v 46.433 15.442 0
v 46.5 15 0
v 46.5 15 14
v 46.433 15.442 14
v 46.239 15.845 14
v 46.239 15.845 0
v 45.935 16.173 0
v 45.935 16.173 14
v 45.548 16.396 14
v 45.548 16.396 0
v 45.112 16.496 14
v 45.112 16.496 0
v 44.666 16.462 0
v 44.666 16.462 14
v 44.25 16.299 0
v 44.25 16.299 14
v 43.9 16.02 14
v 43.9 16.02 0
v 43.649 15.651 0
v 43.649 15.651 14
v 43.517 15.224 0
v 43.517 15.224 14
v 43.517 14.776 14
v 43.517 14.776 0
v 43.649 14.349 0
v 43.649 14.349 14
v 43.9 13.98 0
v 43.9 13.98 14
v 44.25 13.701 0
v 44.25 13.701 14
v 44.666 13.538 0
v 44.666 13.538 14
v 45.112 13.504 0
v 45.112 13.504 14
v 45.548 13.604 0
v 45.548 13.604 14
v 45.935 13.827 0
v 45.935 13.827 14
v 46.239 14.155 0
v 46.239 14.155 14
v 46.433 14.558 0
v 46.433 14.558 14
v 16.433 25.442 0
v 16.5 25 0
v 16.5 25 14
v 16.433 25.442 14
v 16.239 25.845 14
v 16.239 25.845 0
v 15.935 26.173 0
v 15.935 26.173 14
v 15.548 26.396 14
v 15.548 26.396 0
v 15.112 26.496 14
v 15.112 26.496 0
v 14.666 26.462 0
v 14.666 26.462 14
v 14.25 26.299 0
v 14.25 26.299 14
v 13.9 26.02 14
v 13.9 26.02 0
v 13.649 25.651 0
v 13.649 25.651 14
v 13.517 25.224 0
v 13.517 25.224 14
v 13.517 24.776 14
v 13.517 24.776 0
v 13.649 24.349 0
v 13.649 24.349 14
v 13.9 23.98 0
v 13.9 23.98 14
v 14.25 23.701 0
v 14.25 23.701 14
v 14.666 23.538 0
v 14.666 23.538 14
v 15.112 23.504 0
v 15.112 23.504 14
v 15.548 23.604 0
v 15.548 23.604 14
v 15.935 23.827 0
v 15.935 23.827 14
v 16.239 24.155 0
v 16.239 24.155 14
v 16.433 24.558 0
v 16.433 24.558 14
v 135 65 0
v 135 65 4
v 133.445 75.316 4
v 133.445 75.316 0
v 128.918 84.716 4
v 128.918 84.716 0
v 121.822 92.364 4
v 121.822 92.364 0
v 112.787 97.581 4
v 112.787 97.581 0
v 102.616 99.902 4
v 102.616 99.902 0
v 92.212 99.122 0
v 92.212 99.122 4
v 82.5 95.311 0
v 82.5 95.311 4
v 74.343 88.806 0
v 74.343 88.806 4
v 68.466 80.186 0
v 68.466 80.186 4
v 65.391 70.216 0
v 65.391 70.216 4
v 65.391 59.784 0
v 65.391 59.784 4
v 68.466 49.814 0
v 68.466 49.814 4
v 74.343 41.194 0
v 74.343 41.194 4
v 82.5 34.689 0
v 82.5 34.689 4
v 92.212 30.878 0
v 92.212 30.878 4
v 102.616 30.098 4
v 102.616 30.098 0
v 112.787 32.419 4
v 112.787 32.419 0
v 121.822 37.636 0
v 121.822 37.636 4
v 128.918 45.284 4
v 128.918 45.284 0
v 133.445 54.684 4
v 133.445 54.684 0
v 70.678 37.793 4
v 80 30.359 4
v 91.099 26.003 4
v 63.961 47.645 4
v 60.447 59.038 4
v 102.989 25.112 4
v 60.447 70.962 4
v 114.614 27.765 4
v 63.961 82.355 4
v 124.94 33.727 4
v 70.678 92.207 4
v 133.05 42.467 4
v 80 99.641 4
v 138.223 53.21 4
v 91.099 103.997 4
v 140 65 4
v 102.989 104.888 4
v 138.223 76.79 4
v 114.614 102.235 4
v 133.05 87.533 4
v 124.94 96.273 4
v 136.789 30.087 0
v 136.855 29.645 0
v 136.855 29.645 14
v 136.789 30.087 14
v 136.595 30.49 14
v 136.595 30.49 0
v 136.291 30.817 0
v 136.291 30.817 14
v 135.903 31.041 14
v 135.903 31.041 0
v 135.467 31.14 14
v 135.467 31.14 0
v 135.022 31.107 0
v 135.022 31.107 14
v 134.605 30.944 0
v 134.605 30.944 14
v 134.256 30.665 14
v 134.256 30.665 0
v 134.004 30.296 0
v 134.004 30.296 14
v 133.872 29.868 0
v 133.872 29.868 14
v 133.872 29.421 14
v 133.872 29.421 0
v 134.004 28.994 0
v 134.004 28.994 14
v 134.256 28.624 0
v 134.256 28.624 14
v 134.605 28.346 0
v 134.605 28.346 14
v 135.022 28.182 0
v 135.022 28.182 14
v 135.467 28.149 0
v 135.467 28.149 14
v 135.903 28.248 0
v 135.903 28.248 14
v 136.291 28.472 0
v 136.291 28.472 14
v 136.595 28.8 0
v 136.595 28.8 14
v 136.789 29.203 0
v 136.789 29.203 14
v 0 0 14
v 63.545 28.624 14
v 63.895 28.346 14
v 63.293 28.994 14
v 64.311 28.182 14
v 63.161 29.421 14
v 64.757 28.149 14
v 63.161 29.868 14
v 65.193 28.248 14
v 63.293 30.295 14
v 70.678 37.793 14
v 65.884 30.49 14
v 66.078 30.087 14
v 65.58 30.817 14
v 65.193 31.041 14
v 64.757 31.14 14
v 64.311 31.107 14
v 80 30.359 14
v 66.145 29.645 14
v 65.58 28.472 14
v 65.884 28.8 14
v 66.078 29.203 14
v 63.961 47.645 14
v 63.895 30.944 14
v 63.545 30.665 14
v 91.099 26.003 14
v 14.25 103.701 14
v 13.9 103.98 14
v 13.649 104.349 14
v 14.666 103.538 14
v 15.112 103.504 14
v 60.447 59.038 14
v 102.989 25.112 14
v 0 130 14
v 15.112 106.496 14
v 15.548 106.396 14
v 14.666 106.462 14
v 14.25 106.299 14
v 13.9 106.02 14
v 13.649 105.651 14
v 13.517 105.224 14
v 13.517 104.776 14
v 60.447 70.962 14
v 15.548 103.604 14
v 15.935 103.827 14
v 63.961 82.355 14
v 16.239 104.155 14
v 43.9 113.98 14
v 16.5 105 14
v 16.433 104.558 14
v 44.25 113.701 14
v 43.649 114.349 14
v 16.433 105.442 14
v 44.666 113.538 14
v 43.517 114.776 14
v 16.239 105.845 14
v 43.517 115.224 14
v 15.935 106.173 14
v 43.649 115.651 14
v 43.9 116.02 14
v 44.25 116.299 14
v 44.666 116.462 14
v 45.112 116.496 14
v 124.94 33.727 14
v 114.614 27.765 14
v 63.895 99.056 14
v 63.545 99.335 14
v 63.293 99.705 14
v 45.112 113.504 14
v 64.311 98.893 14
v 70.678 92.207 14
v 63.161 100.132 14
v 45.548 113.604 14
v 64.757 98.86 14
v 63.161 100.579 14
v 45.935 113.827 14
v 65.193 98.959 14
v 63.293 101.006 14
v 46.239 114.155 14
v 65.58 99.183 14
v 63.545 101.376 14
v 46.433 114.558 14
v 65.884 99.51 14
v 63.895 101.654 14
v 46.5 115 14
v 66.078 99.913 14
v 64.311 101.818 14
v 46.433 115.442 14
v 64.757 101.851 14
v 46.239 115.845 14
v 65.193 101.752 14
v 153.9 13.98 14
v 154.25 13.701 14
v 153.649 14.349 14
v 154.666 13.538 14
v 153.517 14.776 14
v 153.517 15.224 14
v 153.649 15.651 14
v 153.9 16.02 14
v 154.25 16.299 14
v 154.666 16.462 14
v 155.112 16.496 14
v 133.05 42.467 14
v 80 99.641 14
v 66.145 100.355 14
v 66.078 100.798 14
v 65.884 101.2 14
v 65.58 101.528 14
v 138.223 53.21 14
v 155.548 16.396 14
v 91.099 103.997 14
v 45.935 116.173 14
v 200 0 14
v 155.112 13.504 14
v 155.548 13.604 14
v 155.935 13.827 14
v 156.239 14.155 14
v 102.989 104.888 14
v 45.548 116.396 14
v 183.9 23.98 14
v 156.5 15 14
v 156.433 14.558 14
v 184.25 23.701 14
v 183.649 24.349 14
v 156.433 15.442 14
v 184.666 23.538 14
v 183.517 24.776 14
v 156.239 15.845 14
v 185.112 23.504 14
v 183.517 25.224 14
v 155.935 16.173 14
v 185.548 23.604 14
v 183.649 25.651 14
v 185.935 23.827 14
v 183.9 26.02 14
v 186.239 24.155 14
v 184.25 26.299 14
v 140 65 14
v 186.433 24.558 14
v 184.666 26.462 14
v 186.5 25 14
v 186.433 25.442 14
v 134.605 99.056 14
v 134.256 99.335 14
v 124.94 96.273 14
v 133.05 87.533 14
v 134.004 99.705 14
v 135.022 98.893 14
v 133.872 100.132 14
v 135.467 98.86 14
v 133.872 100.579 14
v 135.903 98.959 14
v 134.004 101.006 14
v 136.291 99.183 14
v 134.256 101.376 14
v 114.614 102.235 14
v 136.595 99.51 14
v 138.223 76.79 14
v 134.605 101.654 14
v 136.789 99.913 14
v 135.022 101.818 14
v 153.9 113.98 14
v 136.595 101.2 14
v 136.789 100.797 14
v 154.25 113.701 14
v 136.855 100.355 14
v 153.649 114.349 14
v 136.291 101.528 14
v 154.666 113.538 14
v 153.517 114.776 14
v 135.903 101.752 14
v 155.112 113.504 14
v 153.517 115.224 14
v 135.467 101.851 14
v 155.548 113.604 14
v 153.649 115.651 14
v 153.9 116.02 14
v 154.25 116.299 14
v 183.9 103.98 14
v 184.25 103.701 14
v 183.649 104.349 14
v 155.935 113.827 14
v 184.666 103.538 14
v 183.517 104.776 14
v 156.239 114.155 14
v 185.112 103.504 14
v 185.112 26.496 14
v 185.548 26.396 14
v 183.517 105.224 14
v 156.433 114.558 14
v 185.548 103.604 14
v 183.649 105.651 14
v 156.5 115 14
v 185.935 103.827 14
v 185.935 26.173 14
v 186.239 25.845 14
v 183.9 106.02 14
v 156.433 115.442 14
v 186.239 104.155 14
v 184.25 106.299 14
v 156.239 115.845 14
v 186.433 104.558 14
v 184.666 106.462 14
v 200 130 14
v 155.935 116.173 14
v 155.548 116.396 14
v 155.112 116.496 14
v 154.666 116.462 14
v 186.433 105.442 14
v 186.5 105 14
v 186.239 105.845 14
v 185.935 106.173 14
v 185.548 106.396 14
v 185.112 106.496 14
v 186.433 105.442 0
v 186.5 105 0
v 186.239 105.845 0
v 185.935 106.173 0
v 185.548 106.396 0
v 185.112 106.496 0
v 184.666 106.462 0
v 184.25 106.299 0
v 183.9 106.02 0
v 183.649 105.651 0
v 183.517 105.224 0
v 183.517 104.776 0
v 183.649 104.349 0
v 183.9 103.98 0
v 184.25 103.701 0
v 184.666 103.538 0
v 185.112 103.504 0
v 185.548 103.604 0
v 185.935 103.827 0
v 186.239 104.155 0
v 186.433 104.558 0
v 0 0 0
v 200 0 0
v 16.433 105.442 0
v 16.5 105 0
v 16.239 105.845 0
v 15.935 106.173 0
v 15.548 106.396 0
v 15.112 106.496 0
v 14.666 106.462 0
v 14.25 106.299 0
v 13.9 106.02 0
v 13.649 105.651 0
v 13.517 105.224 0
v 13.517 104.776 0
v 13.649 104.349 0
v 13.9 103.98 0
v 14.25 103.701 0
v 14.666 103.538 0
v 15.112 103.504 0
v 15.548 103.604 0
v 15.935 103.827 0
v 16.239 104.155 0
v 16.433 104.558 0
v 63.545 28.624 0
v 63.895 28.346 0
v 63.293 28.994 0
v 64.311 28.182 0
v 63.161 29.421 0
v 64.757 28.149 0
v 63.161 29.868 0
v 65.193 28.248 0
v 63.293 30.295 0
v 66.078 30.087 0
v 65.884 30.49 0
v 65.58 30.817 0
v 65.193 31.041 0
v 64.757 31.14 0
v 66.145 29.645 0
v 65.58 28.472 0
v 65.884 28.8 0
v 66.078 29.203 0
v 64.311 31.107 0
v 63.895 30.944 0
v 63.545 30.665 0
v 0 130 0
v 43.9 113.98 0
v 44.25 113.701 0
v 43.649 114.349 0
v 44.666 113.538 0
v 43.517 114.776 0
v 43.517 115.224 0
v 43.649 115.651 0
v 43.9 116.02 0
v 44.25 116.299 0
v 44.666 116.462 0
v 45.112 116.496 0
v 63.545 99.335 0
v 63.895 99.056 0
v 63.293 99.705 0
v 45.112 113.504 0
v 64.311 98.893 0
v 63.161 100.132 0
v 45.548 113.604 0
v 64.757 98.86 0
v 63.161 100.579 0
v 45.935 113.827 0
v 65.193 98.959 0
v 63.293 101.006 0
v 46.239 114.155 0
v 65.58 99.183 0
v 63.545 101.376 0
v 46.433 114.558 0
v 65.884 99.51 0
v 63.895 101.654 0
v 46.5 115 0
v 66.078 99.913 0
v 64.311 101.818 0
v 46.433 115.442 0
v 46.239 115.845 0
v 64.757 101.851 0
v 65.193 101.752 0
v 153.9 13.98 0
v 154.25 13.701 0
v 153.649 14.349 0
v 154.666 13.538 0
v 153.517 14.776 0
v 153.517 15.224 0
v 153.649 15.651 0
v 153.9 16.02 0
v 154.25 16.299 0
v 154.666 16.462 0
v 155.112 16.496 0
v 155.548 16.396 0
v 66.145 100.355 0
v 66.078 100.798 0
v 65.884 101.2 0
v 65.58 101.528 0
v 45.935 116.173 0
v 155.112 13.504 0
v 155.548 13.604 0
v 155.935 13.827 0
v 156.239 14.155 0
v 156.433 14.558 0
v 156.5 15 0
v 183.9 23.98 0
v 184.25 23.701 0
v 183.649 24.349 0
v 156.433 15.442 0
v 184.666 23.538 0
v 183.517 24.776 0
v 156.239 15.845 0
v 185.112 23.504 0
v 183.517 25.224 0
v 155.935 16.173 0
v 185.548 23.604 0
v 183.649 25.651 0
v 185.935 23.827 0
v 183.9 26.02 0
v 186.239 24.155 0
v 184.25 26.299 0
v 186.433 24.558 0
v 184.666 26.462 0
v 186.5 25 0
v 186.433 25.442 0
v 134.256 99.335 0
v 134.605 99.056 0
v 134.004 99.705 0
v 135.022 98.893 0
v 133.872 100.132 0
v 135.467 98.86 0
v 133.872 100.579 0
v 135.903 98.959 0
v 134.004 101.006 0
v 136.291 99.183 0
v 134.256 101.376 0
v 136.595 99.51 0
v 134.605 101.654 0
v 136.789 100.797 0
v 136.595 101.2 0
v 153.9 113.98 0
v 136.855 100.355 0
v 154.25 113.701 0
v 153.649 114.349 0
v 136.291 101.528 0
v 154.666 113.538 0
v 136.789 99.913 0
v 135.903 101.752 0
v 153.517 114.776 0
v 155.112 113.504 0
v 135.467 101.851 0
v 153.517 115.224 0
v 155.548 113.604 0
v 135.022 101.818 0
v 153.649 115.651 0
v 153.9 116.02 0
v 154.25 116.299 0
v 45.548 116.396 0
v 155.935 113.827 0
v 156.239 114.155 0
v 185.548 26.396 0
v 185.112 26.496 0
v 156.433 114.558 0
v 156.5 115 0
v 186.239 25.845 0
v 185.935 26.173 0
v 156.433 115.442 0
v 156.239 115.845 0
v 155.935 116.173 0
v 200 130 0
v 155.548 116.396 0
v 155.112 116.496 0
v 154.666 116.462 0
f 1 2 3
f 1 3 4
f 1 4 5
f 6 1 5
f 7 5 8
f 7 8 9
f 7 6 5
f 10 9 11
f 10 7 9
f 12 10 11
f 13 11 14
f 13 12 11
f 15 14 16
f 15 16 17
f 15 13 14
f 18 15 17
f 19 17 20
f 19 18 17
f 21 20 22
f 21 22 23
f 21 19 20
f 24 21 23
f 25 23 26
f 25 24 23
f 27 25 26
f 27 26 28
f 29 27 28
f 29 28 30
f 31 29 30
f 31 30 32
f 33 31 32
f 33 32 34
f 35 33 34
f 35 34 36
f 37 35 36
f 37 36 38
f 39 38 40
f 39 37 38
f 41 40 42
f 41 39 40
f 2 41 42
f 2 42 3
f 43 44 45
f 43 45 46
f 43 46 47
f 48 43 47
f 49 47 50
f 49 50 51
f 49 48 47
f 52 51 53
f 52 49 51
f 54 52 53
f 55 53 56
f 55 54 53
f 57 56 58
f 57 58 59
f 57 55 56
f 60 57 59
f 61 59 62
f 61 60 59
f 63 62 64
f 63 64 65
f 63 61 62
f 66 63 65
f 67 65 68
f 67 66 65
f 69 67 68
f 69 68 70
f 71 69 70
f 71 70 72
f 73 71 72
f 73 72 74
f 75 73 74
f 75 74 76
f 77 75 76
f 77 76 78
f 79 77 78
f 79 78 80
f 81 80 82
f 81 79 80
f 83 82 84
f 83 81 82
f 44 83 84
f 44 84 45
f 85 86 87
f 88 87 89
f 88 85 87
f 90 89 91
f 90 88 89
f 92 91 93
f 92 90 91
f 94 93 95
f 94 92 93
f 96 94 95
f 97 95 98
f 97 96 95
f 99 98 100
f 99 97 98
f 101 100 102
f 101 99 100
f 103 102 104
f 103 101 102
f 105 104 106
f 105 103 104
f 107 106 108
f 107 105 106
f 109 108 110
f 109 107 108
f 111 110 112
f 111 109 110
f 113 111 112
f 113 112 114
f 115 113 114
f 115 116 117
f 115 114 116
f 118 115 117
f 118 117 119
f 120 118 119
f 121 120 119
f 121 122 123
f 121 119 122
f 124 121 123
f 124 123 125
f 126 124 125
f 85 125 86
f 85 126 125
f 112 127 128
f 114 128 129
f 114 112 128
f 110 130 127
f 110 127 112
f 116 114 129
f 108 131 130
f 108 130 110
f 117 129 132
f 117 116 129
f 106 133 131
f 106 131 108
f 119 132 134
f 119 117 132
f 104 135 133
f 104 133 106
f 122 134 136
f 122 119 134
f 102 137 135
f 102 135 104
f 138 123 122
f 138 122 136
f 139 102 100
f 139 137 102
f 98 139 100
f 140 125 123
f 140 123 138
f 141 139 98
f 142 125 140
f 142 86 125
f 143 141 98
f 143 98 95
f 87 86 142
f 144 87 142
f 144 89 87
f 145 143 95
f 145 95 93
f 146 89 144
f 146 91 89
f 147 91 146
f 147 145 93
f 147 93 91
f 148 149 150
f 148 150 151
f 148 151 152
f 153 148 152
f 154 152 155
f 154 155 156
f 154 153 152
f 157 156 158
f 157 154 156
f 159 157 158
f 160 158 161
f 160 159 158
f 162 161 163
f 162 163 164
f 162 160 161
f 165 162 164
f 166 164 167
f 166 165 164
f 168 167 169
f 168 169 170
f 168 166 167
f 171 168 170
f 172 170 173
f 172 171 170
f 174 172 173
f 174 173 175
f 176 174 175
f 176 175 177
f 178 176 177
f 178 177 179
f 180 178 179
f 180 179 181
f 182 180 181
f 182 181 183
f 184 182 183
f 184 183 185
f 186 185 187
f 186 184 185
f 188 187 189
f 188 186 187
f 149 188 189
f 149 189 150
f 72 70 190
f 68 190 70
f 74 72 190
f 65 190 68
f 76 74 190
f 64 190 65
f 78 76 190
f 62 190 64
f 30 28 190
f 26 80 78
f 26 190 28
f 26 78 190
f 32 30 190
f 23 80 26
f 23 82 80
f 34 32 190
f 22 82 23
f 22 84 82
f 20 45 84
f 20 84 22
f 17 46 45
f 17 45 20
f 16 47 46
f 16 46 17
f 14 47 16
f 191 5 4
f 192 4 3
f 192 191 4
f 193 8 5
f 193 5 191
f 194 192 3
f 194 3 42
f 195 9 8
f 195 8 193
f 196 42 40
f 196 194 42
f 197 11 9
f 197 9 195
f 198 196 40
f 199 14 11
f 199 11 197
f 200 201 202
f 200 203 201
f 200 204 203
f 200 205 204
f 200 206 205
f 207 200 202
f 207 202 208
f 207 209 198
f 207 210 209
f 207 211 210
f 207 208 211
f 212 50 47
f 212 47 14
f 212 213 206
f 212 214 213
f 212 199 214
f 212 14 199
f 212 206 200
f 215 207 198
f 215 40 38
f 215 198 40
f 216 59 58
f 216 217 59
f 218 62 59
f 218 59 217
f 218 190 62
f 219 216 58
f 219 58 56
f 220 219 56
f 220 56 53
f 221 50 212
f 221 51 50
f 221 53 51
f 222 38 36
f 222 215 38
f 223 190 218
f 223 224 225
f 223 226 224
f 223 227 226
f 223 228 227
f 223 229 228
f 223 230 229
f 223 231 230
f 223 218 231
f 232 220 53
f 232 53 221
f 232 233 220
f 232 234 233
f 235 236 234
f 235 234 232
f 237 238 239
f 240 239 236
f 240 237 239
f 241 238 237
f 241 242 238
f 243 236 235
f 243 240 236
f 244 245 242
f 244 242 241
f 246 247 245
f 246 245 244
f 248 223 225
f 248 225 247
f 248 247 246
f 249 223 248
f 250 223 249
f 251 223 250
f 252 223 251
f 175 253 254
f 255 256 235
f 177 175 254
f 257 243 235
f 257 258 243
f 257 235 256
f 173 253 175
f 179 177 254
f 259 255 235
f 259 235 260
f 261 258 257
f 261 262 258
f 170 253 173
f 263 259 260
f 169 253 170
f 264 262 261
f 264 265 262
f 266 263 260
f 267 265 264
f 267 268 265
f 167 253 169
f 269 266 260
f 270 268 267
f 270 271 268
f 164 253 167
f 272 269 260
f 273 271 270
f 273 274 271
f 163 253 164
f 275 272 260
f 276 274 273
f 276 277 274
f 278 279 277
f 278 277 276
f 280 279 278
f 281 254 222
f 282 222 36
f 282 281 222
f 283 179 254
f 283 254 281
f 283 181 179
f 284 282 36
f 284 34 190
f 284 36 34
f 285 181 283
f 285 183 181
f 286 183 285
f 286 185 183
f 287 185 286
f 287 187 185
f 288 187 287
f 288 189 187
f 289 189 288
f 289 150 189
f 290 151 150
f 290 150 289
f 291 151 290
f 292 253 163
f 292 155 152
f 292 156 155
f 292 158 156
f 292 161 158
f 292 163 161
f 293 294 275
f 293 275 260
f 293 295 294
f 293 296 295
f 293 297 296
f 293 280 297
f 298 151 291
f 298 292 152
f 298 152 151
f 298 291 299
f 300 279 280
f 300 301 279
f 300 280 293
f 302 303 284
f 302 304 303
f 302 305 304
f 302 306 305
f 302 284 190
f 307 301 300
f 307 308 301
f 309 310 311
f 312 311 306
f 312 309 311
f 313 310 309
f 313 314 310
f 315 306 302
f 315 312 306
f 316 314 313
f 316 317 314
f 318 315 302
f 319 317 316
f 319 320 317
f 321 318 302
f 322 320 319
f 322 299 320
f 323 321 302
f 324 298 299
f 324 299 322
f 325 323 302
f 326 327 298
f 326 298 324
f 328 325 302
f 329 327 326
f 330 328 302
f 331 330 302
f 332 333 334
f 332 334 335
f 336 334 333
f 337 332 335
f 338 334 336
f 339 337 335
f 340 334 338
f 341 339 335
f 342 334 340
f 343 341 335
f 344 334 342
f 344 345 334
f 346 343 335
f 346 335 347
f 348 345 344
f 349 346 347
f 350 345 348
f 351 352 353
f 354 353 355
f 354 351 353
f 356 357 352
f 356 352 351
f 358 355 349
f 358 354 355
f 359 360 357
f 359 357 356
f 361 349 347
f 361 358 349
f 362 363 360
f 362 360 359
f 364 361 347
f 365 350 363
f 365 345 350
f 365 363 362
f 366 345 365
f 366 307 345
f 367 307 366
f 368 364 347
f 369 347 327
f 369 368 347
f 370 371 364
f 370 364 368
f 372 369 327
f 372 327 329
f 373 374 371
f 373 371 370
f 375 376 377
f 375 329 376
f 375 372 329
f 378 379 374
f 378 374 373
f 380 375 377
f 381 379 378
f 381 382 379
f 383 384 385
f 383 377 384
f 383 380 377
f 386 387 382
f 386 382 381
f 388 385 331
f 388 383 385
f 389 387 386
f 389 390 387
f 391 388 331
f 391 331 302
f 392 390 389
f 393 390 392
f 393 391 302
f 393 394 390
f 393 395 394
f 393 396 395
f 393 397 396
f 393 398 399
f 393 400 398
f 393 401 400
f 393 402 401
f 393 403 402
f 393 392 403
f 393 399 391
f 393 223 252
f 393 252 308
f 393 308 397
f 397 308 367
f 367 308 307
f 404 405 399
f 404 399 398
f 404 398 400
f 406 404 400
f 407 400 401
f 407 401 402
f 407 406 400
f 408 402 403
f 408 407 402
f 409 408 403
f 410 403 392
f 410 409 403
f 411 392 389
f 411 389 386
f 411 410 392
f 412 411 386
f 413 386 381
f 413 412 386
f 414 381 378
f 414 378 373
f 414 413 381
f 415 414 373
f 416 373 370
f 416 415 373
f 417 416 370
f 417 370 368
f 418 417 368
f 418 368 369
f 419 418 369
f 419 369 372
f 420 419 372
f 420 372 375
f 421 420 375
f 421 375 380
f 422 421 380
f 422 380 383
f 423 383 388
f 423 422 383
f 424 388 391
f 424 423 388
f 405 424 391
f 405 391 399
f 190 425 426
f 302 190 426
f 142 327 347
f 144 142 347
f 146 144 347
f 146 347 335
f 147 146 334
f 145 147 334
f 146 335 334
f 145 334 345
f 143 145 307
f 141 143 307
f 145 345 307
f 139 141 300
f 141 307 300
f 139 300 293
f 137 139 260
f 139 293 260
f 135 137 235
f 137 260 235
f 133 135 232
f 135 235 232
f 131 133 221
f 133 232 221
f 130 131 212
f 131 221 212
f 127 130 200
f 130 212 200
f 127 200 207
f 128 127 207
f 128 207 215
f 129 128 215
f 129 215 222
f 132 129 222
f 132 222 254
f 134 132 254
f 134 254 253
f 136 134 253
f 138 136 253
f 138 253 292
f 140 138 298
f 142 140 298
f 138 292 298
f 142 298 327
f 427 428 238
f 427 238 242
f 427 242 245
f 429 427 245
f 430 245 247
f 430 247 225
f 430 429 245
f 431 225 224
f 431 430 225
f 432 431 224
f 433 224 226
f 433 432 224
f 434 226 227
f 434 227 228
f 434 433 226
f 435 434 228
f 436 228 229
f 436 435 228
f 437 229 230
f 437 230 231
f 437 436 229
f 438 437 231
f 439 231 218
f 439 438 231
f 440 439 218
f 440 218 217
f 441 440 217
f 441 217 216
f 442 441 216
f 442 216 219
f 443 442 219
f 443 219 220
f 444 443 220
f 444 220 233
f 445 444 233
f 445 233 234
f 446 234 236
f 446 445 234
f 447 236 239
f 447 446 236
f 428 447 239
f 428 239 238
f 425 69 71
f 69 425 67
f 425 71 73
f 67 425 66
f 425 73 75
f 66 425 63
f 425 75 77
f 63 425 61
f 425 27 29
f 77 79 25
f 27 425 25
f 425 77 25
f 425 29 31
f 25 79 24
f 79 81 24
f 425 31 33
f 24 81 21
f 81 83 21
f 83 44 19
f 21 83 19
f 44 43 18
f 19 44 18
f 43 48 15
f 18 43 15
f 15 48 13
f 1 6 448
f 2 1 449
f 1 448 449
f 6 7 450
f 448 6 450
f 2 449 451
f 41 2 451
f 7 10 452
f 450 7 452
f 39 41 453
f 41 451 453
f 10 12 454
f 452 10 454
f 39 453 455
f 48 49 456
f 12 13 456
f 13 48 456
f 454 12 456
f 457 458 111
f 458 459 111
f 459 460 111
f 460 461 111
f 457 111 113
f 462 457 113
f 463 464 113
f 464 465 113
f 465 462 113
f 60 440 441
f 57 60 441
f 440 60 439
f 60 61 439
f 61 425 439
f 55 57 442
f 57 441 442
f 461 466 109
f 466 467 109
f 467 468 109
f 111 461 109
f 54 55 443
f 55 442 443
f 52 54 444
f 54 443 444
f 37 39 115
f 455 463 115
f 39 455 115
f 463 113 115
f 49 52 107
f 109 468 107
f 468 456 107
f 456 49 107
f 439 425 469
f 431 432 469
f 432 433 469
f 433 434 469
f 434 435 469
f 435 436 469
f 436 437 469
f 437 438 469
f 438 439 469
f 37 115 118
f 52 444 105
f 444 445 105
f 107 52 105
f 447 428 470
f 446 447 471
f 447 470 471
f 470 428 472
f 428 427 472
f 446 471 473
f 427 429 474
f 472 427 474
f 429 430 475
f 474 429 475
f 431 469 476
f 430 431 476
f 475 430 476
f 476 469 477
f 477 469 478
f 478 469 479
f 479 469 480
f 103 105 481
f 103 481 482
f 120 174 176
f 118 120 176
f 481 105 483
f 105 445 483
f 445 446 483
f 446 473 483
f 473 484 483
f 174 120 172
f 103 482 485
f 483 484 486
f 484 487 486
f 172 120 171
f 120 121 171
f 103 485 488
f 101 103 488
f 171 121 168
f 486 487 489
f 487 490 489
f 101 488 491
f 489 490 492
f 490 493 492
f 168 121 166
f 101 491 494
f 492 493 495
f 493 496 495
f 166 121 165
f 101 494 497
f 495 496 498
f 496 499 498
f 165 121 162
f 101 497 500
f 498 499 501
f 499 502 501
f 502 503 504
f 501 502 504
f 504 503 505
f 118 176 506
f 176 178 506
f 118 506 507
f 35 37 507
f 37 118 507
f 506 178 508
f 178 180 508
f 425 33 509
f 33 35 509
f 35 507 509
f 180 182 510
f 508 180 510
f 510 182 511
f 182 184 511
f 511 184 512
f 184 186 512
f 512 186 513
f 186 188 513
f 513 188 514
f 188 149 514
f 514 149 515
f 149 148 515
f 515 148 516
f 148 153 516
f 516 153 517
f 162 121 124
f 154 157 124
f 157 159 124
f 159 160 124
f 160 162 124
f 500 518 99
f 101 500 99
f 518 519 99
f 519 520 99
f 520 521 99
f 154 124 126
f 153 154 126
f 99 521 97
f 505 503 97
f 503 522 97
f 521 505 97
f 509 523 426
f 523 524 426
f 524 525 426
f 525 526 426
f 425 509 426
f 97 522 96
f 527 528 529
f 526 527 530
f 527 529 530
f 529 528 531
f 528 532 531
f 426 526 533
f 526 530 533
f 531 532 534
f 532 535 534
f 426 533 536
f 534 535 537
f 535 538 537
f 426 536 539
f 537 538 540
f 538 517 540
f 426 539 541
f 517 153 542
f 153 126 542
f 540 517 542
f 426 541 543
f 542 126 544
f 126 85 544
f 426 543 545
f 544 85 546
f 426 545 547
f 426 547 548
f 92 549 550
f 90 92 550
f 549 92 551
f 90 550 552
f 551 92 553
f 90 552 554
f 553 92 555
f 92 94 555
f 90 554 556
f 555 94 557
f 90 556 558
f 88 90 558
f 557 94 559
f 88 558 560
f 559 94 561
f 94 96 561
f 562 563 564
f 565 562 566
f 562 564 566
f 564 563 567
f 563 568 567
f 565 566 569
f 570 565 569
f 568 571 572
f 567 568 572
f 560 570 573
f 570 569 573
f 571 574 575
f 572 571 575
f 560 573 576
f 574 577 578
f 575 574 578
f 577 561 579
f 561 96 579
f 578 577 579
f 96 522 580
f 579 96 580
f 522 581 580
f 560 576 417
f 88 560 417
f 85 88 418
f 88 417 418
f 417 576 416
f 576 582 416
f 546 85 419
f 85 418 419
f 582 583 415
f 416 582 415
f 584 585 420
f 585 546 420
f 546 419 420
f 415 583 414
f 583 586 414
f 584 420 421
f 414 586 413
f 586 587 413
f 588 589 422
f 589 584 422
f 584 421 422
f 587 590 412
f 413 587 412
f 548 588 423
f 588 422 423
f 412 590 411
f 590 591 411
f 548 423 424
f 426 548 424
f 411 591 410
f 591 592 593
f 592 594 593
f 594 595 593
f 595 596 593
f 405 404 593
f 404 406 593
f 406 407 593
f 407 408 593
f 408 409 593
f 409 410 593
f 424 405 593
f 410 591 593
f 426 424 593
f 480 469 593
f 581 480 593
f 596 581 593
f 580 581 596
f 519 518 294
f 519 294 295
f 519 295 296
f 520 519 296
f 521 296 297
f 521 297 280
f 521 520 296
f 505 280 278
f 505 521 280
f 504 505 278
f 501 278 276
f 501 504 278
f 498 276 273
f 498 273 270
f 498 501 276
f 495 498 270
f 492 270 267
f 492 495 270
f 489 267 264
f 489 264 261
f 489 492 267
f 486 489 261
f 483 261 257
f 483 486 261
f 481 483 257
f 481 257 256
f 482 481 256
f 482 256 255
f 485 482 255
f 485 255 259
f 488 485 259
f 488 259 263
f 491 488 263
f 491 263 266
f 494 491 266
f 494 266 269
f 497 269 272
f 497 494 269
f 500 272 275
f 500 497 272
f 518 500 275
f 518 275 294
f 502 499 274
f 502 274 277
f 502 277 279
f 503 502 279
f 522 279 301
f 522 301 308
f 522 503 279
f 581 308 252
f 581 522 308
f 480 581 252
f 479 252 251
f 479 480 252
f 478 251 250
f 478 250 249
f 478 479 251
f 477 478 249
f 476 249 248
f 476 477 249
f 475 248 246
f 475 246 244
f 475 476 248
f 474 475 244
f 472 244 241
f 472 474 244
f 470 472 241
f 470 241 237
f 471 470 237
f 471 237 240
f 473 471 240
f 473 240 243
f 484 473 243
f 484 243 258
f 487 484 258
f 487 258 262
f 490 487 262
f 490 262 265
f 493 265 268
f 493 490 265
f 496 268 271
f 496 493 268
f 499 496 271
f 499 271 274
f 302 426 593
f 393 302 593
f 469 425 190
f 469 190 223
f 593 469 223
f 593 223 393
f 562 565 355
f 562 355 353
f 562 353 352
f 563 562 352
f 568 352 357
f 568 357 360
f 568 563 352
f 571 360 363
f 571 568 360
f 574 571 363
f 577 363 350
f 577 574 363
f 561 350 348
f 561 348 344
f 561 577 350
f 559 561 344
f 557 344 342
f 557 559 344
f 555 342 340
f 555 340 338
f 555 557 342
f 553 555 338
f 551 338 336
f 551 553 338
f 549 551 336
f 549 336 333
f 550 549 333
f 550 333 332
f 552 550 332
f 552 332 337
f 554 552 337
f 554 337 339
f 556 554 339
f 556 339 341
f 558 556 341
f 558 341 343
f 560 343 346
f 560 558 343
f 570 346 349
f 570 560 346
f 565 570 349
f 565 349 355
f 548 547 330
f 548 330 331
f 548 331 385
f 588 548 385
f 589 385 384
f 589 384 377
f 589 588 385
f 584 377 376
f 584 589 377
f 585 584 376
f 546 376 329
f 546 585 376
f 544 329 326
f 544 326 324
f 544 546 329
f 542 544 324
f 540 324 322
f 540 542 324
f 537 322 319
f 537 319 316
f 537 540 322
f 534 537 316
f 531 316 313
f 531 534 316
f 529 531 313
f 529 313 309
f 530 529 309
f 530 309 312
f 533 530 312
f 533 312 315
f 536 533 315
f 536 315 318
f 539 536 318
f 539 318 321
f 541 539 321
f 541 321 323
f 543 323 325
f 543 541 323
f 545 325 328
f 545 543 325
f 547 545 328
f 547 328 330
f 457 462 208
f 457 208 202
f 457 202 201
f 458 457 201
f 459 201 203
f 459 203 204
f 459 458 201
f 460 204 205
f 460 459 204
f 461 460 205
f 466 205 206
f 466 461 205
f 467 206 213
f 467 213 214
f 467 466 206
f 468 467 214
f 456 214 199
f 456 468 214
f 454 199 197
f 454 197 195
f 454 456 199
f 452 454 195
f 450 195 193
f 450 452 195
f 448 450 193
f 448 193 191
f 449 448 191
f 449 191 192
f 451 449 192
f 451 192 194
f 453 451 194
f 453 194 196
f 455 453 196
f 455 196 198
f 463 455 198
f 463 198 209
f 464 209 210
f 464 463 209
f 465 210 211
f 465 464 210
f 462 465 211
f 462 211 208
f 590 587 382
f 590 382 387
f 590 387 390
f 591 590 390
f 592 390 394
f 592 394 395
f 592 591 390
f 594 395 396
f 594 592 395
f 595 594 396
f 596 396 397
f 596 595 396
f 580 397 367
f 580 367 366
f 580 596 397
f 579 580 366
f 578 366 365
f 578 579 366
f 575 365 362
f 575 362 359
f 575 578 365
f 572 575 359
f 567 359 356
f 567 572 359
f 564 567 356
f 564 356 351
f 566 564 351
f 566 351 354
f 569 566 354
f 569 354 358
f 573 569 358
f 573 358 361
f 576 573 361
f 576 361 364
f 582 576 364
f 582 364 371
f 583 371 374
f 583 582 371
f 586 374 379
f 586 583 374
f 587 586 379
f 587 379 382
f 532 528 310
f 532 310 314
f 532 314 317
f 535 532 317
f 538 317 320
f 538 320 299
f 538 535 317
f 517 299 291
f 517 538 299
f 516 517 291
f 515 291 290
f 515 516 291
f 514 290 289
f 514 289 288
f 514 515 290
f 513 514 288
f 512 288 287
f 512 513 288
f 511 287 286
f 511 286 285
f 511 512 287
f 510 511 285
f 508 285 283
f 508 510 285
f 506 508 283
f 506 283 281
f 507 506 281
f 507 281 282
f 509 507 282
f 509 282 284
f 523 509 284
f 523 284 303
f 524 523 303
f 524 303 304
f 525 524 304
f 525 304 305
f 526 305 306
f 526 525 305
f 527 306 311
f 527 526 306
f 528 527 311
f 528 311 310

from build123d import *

# Parameters (mm, degrees)
SKETCH_W     = 200
SKETCH_H     = 130
SKETCH_R     = 35
SKETCH_R_2   = 1.5
PAD_DEPTH    = 14
SKETCH001_R  = 40
POCKET_DEPTH = 10


with BuildPart() as part:
    # Sketch → Pad (new body)
    with BuildSketch(Plane.XY):
        with Locations((100, 65)):
            Rectangle(SKETCH_W, SKETCH_H)
        with Locations((100, 65)):
            Circle(SKETCH_R, mode=Mode.SUBTRACT)
        with Locations((45, 115)):
            Circle(SKETCH_R_2, mode=Mode.SUBTRACT)
        with Locations((45, 15)):
            Circle(SKETCH_R_2, mode=Mode.SUBTRACT)
        with Locations((155, 115)):
            Circle(SKETCH_R_2, mode=Mode.SUBTRACT)
        with Locations((155, 15)):
            Circle(SKETCH_R_2, mode=Mode.SUBTRACT)
        with Locations((15, 105)):
            Circle(SKETCH_R_2, mode=Mode.SUBTRACT)
        with Locations((15, 25)):
            Circle(SKETCH_R_2, mode=Mode.SUBTRACT)
        with Locations((185, 105)):
            Circle(SKETCH_R_2, mode=Mode.SUBTRACT)
        with Locations((185, 25)):
            Circle(SKETCH_R_2, mode=Mode.SUBTRACT)
        with Locations((135.355339, 100.355339)):
            Circle(SKETCH_R_2, mode=Mode.SUBTRACT)
        with Locations((64.644661, 29.644661)):
            Circle(SKETCH_R_2, mode=Mode.SUBTRACT)
        with Locations((64.64463, 100.35537)):
            Circle(SKETCH_R_2, mode=Mode.SUBTRACT)
        with Locations((135.355307, 29.644693)):
            Circle(SKETCH_R_2, mode=Mode.SUBTRACT)
    extrude(amount=PAD_DEPTH)

    # Sketch001 (on Face19 of Pad) → Pocket (cut)
    with BuildSketch(Plane.XY.offset(14)):
        with Locations((100, 65)):
            Circle(SKETCH001_R)
    extrude(amount=-POCKET_DEPTH, mode=Mode.SUBTRACT)


solid = part.part
